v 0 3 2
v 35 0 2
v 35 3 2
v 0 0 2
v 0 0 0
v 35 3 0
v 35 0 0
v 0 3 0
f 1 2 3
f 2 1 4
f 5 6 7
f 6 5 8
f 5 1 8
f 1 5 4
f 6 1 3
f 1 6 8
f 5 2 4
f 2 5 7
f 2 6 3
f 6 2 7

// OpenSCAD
translate([2.5, 1.5, 1.0]) color([0.1150124003280546, 0.8219806914298157, 0.8528586901873659]) cube([5, 3, 2], center=true);
translate([7.5, 1.5, 1.0]) color([0.02761895137288195, 0.5258157137901469, 0.752438401258893]) cube([5, 3, 2], center=true);
translate([12.5, 1.5, 1.0]) color([0.20168791799925478, 0.4970874741521001, 0.2564796746315954]) cube([5, 3, 2], center=true);
translate([17.5, 1.5, 1.0]) color([0.6409972685732053, 0.9970404948887329, 0.797433214008021]) cube([5, 3, 2], center=true);
translate([22.5, 1.5, 1.0]) color([0.6234150837835258, 0.10462968943990791, 0.4584080456050631]) cube([5, 3, 2], center=true);
translate([27.5, 1.5, 1.0]) color([0.3616420965372864, 0.8269865896652219, 0.10474628201641056]) cube([5, 3, 2], center=true);
translate([32.5, 1.5, 1.0]) color([0.596240475647071, 0.48790140560568873, 0.5639041170917963]) cube([5, 3, 2], center=true);
